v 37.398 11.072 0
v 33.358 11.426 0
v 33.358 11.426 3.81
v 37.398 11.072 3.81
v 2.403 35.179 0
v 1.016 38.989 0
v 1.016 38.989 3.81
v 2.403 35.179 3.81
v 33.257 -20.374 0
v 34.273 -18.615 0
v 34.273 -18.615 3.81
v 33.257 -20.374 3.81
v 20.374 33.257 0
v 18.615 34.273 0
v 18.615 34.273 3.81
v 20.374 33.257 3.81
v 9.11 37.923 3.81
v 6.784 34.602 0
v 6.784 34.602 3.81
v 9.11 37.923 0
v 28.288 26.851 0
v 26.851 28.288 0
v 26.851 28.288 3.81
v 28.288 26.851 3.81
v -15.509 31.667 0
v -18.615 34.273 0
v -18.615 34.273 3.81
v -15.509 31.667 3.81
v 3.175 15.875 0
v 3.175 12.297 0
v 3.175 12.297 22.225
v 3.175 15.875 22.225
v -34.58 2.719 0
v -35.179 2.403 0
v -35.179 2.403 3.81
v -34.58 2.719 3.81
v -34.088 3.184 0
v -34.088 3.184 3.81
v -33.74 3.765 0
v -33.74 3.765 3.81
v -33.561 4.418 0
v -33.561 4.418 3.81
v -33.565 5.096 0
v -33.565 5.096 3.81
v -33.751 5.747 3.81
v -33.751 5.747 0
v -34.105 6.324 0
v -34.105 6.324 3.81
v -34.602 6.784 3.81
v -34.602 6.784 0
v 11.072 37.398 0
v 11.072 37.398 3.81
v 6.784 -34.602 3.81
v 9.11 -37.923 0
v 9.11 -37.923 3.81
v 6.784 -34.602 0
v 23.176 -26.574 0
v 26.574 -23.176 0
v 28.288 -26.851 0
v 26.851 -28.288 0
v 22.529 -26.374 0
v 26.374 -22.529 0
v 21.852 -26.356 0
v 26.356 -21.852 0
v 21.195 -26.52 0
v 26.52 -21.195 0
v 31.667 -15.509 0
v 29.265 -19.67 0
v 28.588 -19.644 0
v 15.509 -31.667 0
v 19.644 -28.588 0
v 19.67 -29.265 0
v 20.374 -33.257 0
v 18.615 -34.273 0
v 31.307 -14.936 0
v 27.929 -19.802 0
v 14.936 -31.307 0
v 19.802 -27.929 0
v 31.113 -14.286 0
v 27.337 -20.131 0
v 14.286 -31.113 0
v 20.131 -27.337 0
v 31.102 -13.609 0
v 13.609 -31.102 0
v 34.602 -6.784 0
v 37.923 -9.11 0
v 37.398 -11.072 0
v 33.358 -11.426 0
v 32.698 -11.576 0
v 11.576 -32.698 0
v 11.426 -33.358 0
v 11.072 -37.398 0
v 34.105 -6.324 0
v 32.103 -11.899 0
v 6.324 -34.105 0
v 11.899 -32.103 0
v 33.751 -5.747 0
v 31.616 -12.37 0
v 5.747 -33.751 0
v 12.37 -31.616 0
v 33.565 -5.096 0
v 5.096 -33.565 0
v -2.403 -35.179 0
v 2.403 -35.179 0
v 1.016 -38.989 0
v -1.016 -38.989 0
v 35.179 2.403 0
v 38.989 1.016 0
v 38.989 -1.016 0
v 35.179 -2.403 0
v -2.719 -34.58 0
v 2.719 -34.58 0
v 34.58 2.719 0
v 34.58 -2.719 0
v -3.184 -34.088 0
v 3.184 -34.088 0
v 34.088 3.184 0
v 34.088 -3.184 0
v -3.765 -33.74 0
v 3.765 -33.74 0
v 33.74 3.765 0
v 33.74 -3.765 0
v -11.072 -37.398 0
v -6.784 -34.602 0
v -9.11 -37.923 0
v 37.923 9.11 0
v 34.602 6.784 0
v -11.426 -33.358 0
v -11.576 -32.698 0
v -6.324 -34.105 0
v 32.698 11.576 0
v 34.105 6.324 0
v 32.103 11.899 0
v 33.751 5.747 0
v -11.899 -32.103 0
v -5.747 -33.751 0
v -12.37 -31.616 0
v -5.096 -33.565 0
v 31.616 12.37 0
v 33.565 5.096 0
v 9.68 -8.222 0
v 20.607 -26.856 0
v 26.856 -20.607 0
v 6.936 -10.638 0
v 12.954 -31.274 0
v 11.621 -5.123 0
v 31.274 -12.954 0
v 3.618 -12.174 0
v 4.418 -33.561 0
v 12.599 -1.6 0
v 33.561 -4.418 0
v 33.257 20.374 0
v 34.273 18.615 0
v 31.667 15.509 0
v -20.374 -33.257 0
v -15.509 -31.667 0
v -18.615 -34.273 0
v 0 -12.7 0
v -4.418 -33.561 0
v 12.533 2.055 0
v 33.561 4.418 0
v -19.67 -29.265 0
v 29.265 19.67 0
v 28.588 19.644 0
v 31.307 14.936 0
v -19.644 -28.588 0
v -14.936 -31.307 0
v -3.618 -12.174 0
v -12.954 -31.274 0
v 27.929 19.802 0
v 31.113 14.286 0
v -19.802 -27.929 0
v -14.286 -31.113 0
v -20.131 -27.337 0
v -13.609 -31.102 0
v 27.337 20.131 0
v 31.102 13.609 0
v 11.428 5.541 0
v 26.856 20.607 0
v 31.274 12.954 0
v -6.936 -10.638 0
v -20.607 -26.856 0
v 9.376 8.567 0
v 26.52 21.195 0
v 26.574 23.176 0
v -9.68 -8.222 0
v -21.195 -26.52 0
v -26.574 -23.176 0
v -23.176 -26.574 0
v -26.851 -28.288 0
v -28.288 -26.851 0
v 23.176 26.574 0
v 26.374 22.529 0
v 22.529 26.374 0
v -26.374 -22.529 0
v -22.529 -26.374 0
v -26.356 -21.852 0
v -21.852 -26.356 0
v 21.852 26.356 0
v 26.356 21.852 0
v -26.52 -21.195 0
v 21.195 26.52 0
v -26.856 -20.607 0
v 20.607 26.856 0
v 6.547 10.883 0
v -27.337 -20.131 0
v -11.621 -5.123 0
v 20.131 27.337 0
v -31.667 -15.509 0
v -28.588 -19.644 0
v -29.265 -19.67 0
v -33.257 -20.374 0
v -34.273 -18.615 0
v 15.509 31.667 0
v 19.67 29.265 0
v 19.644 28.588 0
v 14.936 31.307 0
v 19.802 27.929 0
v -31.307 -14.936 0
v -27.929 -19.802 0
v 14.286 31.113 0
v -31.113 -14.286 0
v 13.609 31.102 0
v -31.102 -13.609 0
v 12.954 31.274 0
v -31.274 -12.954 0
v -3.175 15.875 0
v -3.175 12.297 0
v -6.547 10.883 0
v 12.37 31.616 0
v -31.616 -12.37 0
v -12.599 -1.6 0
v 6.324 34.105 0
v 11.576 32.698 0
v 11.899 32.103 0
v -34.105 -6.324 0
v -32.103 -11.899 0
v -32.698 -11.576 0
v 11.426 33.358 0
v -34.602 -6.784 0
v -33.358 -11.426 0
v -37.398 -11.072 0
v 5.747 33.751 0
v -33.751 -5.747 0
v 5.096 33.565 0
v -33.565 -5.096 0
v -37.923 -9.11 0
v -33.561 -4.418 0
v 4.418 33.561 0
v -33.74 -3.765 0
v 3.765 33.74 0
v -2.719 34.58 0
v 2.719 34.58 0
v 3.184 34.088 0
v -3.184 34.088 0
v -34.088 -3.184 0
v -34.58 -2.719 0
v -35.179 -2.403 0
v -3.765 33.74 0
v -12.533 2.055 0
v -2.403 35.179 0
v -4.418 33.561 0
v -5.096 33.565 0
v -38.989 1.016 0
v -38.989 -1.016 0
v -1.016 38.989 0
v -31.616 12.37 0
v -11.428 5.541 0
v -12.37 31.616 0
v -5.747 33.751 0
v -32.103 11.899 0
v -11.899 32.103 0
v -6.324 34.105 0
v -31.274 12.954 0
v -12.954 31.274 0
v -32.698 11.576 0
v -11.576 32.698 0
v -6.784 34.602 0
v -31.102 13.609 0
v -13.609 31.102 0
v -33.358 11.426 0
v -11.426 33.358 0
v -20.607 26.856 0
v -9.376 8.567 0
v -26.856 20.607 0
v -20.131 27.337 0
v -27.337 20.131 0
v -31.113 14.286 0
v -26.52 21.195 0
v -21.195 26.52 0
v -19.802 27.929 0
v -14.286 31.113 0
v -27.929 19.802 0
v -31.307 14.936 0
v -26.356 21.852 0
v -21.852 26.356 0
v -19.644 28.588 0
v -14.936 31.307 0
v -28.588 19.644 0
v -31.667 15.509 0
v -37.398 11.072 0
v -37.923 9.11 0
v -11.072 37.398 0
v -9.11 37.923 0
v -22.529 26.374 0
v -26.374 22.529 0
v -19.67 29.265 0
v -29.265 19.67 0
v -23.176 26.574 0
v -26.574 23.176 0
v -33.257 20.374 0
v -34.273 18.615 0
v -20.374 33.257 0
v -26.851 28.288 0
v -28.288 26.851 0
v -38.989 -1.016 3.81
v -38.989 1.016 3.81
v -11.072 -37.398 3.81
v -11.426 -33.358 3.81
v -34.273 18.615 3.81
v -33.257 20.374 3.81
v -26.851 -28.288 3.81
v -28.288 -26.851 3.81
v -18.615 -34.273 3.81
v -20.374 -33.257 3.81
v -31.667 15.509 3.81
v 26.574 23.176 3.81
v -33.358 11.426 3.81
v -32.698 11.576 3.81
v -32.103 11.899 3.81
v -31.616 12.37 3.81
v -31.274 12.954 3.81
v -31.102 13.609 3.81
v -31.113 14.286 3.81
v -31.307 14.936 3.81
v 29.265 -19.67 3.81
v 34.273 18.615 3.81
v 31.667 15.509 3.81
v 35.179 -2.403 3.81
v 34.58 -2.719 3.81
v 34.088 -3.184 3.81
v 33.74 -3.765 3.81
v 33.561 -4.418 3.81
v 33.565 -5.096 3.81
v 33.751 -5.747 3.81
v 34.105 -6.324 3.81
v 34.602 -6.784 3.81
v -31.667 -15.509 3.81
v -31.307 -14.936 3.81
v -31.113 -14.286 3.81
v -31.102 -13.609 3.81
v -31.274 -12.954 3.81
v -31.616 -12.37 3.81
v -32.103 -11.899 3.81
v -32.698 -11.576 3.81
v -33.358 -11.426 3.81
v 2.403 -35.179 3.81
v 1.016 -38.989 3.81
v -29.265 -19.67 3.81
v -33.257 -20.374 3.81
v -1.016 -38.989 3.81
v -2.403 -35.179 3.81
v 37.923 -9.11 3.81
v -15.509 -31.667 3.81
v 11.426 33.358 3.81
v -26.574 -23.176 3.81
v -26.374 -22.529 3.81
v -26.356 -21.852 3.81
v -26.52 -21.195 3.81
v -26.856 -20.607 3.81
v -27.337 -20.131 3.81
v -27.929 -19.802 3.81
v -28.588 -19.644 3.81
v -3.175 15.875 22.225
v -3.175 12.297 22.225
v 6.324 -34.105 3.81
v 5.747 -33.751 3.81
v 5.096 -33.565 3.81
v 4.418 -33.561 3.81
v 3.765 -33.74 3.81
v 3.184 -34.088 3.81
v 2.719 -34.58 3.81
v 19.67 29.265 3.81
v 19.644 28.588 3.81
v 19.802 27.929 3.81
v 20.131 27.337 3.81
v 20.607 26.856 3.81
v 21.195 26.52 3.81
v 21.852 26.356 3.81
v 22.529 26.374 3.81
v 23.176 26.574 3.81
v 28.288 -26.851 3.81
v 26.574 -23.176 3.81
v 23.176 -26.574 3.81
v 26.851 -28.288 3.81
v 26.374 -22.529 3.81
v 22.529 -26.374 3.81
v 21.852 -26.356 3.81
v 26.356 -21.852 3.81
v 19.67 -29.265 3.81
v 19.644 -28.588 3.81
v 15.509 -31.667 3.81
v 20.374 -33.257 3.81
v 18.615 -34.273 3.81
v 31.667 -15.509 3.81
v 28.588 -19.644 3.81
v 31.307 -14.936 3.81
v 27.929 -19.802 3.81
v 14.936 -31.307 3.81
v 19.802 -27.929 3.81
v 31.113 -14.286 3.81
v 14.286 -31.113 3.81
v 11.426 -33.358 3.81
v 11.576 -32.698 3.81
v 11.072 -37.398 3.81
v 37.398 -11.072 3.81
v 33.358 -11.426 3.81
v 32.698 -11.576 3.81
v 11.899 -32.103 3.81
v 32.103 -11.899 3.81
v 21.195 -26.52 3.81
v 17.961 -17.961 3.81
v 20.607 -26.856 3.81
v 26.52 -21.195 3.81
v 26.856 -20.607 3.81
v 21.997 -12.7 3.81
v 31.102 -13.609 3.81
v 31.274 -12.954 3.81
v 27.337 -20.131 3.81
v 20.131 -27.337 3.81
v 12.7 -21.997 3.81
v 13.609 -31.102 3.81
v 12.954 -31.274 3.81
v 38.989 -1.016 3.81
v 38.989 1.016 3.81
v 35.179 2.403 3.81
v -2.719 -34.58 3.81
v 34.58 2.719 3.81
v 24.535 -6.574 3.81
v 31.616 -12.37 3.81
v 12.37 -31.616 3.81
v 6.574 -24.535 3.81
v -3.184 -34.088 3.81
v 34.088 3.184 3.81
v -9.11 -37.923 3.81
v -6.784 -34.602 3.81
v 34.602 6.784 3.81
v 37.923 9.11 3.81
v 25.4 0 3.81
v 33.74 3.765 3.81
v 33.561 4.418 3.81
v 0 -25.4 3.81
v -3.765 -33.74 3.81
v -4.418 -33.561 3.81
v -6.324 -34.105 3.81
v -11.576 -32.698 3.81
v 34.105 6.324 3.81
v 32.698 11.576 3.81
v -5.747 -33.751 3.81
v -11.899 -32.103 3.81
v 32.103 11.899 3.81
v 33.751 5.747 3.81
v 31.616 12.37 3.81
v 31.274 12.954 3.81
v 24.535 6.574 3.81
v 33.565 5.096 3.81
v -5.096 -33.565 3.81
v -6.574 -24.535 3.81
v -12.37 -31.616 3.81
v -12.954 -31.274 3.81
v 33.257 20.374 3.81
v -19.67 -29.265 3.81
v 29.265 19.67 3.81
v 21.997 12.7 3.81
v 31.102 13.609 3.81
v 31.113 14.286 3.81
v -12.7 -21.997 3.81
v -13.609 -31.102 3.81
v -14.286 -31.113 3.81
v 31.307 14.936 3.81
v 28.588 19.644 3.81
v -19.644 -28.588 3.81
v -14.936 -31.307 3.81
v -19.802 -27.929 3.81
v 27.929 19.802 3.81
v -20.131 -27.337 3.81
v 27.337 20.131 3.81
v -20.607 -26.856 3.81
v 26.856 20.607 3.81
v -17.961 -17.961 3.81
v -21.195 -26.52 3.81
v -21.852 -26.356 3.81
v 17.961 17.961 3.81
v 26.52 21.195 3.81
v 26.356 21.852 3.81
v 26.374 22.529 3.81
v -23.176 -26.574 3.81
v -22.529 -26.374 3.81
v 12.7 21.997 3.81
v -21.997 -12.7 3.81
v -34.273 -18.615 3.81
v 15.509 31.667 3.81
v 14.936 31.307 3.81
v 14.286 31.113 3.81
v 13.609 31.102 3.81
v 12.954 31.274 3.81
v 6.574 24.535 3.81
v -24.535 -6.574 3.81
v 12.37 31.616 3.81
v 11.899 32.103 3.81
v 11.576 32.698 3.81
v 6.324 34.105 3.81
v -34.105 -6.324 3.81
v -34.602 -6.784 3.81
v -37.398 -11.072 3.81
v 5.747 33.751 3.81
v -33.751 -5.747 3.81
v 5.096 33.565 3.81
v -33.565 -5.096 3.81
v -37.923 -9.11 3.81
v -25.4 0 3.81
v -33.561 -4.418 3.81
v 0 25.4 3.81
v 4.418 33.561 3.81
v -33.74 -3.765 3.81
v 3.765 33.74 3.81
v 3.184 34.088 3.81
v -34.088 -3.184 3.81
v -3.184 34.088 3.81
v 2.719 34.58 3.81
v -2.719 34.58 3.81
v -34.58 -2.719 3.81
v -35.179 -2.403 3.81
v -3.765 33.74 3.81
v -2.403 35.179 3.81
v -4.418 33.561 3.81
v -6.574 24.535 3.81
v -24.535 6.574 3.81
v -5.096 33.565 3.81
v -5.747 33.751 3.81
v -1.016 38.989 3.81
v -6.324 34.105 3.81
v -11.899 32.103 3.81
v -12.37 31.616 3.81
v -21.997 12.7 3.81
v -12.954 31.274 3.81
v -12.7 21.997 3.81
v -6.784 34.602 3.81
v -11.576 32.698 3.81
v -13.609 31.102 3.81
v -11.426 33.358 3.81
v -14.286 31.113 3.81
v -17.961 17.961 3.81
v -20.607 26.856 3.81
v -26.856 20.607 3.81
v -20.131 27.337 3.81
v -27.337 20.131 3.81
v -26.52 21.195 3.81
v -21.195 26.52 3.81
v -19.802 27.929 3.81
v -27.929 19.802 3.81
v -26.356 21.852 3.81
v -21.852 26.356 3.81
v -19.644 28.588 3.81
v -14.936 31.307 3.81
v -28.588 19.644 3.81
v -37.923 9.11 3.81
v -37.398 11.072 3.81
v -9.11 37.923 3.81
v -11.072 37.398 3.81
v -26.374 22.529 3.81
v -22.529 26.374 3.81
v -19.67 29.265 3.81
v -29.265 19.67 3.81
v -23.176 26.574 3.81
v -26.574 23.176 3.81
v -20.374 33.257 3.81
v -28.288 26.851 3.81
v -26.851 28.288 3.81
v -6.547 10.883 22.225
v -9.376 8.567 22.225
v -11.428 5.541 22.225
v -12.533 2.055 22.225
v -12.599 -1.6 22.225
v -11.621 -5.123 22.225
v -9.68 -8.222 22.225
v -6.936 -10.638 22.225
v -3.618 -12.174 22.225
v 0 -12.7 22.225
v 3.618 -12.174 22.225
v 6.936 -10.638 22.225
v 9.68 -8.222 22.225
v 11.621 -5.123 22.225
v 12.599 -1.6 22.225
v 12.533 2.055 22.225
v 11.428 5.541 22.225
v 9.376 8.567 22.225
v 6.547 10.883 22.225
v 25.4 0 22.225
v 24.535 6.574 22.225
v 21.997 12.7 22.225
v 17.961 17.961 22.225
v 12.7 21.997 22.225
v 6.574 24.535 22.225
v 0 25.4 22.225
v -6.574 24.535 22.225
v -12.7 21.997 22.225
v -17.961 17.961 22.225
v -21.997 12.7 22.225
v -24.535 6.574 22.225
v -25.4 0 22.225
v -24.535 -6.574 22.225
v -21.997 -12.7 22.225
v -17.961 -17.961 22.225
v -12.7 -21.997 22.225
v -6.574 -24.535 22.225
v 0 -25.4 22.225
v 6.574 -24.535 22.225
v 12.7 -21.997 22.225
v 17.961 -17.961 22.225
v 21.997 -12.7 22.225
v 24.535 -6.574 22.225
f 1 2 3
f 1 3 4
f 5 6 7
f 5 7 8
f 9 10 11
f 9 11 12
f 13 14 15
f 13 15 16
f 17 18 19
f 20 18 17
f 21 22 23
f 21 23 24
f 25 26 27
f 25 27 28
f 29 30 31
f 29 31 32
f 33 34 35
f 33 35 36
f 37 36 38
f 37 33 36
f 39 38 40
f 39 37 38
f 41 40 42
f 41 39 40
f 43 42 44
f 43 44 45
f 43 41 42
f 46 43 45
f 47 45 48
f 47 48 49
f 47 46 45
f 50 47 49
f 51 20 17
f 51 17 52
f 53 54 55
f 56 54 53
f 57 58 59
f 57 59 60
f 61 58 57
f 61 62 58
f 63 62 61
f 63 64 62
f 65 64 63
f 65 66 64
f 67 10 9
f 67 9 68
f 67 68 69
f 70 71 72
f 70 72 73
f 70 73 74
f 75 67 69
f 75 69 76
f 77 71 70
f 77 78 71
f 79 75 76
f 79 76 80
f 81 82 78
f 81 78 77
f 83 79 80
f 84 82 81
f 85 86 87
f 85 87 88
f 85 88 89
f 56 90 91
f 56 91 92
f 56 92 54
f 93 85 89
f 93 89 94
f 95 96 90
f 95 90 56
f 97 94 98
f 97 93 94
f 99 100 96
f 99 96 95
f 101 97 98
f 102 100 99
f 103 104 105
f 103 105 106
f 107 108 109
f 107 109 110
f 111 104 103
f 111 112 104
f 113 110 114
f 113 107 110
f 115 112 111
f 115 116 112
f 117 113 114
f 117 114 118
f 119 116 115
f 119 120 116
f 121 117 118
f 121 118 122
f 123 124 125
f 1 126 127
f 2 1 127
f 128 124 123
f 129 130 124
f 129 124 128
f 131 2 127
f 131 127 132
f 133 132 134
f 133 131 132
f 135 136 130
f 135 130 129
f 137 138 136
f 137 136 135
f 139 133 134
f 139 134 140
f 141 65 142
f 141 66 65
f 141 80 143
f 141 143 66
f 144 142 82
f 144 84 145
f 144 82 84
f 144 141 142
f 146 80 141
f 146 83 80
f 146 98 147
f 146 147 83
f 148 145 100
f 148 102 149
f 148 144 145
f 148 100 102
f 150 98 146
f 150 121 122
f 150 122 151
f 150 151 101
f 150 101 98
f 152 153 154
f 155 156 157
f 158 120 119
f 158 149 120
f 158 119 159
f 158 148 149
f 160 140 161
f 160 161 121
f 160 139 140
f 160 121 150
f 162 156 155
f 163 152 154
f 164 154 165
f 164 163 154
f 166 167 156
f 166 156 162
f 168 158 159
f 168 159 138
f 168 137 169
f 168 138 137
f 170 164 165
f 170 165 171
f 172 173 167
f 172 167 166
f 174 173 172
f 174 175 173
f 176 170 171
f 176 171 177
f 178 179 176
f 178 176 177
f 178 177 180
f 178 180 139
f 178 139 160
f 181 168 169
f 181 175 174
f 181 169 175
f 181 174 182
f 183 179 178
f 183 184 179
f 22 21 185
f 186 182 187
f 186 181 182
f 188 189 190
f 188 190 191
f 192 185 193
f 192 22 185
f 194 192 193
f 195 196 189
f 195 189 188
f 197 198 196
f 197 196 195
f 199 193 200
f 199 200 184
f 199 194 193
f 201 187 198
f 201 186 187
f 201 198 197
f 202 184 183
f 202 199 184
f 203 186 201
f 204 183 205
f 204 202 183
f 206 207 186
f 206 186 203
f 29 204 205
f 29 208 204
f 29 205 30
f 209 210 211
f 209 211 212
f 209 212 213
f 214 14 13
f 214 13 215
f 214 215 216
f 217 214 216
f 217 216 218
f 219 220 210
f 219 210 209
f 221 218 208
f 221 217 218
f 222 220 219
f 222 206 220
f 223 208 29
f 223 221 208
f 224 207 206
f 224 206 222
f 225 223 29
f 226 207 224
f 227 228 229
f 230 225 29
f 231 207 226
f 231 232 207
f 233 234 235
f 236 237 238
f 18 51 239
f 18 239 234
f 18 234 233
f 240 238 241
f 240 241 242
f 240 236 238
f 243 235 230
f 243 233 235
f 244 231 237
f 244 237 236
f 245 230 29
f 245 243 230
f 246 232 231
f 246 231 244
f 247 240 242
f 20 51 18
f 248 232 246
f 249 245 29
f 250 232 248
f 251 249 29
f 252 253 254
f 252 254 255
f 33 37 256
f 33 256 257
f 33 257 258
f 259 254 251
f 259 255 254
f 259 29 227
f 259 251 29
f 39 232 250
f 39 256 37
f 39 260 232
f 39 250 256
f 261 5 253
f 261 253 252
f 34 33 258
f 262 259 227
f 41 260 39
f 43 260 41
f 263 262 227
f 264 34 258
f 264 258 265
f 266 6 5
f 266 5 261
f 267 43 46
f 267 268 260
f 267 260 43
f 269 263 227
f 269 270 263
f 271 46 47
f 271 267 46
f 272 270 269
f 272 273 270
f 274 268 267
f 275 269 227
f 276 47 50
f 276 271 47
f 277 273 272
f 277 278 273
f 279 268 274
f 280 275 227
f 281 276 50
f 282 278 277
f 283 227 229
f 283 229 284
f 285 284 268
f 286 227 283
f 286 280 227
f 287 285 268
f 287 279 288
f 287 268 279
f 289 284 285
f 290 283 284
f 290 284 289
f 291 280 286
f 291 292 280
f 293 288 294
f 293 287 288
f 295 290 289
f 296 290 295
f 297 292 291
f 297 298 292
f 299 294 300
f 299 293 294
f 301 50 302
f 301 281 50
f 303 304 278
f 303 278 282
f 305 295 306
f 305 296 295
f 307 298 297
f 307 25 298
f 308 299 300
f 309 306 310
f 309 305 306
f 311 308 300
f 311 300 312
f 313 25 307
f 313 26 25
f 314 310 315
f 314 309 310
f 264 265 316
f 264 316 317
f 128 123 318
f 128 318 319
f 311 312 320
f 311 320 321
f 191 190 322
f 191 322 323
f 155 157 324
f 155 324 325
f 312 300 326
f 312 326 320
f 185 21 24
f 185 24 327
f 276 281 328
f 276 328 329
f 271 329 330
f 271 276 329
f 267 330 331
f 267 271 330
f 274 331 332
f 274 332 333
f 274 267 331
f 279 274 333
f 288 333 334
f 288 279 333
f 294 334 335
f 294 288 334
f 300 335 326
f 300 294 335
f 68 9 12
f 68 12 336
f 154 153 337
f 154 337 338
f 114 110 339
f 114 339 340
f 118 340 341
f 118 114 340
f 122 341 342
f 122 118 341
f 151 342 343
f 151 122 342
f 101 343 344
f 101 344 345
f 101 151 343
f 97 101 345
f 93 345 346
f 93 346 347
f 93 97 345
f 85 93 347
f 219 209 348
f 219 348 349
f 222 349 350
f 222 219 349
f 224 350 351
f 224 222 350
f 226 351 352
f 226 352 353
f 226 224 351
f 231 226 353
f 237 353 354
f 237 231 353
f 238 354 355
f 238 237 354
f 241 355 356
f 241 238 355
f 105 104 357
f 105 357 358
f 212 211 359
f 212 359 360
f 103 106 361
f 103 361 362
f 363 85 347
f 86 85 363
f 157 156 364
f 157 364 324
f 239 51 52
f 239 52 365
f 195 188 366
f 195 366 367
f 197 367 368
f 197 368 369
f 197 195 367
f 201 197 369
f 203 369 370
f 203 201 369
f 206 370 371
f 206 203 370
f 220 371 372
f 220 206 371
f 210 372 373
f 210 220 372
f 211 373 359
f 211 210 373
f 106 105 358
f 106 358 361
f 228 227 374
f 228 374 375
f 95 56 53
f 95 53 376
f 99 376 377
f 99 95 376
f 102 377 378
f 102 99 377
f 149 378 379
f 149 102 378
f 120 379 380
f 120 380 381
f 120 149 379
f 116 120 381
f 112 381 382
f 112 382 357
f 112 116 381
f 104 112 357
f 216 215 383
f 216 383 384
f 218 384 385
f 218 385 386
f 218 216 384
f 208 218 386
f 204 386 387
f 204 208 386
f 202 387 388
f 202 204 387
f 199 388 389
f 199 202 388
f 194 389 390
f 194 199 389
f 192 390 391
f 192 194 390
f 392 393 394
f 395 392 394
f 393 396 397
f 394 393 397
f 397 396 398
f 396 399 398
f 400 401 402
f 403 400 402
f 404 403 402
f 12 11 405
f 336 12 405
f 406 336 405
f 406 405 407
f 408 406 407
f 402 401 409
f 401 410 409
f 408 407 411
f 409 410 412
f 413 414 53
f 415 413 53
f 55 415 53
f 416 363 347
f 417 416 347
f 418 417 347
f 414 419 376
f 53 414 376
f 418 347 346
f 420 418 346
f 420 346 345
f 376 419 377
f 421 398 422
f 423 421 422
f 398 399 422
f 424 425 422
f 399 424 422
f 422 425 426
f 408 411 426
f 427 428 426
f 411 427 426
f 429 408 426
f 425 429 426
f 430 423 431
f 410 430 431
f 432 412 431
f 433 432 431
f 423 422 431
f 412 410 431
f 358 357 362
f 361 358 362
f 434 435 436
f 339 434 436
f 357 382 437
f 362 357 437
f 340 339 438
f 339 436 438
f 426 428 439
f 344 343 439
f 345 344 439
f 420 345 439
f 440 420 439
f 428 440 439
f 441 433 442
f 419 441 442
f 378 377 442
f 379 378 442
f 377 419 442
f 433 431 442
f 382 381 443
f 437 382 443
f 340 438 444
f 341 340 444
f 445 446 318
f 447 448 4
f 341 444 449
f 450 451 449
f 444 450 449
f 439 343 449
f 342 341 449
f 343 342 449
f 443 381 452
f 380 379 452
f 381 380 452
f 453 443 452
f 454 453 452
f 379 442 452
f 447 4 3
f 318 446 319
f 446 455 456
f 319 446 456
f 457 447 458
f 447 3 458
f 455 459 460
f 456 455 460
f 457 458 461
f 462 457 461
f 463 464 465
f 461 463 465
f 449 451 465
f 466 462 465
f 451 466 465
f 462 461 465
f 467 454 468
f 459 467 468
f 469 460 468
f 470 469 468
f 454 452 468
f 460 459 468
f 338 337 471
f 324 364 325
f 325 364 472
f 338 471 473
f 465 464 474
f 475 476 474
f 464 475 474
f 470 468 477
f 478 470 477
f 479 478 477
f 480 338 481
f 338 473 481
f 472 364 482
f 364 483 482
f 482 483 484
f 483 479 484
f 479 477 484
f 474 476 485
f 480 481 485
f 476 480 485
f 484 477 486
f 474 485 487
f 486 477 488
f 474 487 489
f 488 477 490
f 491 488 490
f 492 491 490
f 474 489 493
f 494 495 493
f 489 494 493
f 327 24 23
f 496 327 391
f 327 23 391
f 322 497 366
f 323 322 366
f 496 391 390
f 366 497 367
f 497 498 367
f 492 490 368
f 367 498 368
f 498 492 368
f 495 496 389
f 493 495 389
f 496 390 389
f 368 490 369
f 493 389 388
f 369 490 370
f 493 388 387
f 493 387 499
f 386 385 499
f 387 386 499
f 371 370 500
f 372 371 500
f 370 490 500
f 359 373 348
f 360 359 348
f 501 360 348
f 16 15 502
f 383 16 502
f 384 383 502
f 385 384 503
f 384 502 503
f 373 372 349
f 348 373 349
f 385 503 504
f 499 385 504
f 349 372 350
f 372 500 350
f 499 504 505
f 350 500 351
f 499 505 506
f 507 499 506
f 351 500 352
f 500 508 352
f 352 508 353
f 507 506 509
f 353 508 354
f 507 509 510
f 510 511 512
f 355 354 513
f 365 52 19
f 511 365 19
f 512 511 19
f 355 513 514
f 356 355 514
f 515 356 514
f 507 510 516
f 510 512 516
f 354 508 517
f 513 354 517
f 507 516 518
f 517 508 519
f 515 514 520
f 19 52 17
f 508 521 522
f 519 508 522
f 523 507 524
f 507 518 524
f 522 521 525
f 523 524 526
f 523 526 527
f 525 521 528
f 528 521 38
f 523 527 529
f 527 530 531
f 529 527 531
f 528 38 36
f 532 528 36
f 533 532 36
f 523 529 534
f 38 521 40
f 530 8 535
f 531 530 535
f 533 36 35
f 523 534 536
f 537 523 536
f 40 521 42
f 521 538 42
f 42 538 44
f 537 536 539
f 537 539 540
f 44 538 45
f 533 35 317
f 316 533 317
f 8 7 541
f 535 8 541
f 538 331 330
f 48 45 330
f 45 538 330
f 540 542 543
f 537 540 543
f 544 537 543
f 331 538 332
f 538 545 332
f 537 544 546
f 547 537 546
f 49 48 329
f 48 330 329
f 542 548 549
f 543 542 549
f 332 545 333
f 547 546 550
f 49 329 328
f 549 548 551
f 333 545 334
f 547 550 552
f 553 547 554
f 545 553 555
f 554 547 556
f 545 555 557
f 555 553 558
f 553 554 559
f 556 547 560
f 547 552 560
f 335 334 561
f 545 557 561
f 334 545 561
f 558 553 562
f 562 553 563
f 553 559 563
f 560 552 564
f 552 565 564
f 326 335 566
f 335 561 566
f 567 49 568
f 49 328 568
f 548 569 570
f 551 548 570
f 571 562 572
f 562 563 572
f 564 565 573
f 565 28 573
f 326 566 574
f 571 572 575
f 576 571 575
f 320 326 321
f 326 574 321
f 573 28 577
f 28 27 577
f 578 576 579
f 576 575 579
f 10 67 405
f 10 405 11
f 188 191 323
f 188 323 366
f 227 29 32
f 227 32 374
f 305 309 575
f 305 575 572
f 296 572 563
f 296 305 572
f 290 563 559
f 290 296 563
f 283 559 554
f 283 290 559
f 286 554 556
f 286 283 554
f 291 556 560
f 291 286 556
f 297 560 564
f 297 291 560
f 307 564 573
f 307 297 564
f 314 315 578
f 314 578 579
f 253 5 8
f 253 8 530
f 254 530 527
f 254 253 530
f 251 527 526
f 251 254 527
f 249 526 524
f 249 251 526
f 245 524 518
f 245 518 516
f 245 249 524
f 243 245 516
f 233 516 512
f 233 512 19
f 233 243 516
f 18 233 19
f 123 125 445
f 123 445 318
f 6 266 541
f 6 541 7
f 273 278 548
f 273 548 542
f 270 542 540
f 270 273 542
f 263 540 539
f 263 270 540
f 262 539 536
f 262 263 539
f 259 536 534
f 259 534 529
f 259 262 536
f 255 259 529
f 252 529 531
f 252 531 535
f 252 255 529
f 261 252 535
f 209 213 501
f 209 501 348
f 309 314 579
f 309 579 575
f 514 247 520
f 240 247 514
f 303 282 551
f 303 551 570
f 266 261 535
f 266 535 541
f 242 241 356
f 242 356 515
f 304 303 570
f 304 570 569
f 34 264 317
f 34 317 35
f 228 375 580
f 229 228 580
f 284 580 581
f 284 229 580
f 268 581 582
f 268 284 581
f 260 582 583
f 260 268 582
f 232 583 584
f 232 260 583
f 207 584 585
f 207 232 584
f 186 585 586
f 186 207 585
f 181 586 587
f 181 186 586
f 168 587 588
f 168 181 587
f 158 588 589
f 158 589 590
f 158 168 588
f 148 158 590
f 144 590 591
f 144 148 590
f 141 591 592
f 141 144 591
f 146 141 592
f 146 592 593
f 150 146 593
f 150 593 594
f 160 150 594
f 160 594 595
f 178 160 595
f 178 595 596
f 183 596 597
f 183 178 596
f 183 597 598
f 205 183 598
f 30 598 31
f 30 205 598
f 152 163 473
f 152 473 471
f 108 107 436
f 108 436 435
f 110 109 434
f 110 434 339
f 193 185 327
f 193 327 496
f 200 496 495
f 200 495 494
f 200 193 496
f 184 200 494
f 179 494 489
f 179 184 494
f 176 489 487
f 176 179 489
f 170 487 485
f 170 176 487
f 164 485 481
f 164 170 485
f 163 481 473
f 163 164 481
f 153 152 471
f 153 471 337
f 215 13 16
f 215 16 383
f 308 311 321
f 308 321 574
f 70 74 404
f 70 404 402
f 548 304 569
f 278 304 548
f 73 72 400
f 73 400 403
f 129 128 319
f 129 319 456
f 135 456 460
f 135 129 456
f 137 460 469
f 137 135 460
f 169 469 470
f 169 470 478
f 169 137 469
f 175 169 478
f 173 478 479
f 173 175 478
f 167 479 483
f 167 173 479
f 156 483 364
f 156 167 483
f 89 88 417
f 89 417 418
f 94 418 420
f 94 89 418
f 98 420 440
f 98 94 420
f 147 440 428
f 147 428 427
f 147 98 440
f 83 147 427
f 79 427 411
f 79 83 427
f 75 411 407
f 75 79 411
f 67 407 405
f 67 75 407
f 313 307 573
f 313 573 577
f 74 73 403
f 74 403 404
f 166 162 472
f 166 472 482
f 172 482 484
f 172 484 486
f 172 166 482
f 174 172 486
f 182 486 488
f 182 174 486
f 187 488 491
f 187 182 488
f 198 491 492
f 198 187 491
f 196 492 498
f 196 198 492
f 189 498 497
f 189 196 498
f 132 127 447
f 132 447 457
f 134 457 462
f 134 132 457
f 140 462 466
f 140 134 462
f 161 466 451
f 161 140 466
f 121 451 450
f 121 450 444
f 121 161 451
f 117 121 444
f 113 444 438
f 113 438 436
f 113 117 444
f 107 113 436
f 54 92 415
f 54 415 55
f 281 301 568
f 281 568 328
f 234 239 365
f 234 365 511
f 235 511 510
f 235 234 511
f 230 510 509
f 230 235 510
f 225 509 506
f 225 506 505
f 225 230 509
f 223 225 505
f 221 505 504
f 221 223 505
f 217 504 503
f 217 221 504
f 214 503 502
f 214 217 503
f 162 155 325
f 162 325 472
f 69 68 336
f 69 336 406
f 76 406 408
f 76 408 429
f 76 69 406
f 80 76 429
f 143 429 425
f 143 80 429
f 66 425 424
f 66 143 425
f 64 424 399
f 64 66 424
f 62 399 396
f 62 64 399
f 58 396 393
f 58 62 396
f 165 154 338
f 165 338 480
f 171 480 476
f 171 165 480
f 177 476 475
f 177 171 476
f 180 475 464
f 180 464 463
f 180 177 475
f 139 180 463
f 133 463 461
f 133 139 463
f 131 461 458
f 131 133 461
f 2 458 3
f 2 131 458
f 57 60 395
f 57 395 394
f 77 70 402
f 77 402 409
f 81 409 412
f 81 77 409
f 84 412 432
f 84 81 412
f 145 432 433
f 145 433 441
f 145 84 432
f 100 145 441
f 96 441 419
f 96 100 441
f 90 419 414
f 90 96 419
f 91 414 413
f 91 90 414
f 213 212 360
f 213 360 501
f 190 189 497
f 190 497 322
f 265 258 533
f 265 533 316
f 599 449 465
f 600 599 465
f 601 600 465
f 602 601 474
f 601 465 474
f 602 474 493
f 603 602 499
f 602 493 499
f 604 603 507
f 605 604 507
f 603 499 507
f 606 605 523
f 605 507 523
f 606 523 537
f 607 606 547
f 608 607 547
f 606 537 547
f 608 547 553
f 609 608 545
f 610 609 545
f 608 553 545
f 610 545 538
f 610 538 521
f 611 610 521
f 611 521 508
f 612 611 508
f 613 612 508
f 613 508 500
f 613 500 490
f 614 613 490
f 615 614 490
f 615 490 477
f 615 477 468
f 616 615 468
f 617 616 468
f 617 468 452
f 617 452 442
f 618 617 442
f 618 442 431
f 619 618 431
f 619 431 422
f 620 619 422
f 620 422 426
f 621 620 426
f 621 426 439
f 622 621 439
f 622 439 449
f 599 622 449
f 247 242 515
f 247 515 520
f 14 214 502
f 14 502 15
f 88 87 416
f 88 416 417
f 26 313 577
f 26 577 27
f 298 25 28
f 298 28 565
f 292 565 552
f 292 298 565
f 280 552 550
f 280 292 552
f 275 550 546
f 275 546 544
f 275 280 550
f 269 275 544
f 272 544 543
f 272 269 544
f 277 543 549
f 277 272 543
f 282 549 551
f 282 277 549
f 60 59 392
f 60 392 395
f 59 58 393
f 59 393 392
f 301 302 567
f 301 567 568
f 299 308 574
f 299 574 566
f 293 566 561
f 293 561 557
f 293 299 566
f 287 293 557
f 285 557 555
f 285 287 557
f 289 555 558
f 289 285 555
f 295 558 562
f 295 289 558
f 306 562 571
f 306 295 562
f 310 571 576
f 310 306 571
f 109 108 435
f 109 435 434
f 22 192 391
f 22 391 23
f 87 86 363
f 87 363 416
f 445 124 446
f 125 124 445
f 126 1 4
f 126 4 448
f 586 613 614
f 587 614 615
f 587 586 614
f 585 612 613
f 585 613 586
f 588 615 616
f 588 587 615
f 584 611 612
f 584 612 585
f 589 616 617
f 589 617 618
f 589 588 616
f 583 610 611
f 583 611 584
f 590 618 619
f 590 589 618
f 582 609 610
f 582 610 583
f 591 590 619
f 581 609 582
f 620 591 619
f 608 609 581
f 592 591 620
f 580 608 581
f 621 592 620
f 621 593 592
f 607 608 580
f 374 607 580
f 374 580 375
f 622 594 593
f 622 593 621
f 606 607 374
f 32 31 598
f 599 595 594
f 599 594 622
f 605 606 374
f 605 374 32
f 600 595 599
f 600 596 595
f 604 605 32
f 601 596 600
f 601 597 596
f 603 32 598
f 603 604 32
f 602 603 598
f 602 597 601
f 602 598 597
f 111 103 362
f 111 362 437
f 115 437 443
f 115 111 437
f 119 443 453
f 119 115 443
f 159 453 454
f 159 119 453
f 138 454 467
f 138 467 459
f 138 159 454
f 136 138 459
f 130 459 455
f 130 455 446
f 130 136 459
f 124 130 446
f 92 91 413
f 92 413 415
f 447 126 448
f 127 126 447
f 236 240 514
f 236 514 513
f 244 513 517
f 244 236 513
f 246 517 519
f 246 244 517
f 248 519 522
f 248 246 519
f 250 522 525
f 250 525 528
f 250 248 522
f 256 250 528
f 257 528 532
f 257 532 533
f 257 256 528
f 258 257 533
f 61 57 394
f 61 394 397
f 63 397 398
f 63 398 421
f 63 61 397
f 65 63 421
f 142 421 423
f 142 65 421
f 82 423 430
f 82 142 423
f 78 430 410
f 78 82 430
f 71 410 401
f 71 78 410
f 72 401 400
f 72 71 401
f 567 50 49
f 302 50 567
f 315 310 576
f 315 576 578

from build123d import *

# Parameters (mm, degrees)
SKETCH1_R           = 25.4
BOSS_EXTRUDE1_DEPTH = 3.81
SKETCH1_3_R         = 25.4
BOSS_EXTRUDE2_DEPTH = 22.225


with BuildPart() as part:
    # Sketch1 → Boss-Extrude1 (new body)
    with BuildSketch(Plane.XY):
        with BuildLine():
            Line((1.016, 38.989), (-1.016, 38.989))
            Line((-1.016, 38.989), (-2.402726593, 35.179))
            ThreePointArc((-2.402726593, 35.179), (-4.418420371, 33.561234708), (-6.784139518, 34.602176045))
            Line((-6.784139518, 34.602176045), (-9.10971511, 37.923442191))
            Line((-9.10971511, 37.923442191), (-11.072476389, 37.397521891))
            Line((-11.072476389, 37.397521891), (-11.425850857, 33.358433241))
            ThreePointArc((-11.425850857, 33.358433241), (-12.954153068, 31.274092025), (-15.508677732, 31.667270976))
            Line((-15.508677732, 31.667270976), (-18.61461819, 34.273464468))
            Line((-18.61461819, 34.273464468), (-20.37438181, 33.257464468))
            Line((-20.37438181, 33.257464468), (-19.670322267, 29.264544383))
            ThreePointArc((-19.670322268, 29.264544383), (-20.60708164, 26.855671653), (-23.176325188, 26.574293722))
            Line((-23.176325188, 26.574293722), (-26.850965802, 28.287806781))
            Line((-26.850965802, 28.287806781), (-28.287806781, 26.850965802))
            Line((-28.287806781, 26.850965802), (-26.574293722, 23.176325188))
            ThreePointArc((-26.574293722, 23.176325188), (-26.855671653, 20.60708164), (-29.264544383, 19.670322268))
            Line((-29.264544383, 19.670322268), (-33.257464468, 20.37438181))
            Line((-33.257464468, 20.37438181), (-34.273464468, 18.61461819))
            Line((-34.273464468, 18.61461819), (-31.667270976, 15.508677732))
            ThreePointArc((-31.667270976, 15.508677732), (-31.274092025, 12.954153068), (-33.358433241, 11.425850857))
            Line((-33.358433241, 11.425850857), (-37.397521891, 11.072476389))
            Line((-37.397521891, 11.072476389), (-37.923442191, 9.10971511))
            Line((-37.923442191, 9.10971511), (-34.602176045, 6.784139518))
            ThreePointArc((-34.602176045, 6.784139518), (-33.561234708, 4.418420371), (-35.179, 2.402726593))
            Line((-35.179, 2.402726593), (-38.989, 1.016))
            Line((-38.989, 1.016), (-38.989, -1.016))
            Line((-38.989, -1.016), (-35.179, -2.402726593))
            ThreePointArc((-35.179, -2.402726593), (-33.561234708, -4.418420371), (-34.602176045, -6.784139518))
            Line((-34.602176045, -6.784139518), (-37.923442191, -9.10971511))
            Line((-37.923442191, -9.10971511), (-37.397521891, -11.072476389))
            Line((-37.397521891, -11.072476389), (-33.358433241, -11.425850857))
            ThreePointArc((-33.358433241, -11.425850857), (-31.274092025, -12.954153068), (-31.667270976, -15.508677732))
            Line((-31.667270976, -15.508677732), (-34.273464468, -18.61461819))
            Line((-34.273464468, -18.61461819), (-33.257464468, -20.37438181))
            Line((-33.257464468, -20.37438181), (-29.264544383, -19.670322268))
            ThreePointArc((-29.264544383, -19.670322268), (-26.855671653, -20.60708164), (-26.574293722, -23.176325188))
            Line((-26.574293722, -23.176325188), (-28.287806781, -26.850965802))
            Line((-28.287806781, -26.850965802), (-26.850965802, -28.287806781))
            Line((-26.850965802, -28.287806781), (-23.176325188, -26.574293722))
            ThreePointArc((-23.176325188, -26.574293722), (-20.60708164, -26.855671653), (-19.670322268, -29.264544383))
            Line((-19.670322268, -29.264544383), (-20.37438181, -33.257464468))
            Line((-20.37438181, -33.257464468), (-18.61461819, -34.273464468))
            Line((-18.61461819, -34.273464468), (-15.508677732, -31.667270976))
            ThreePointArc((-15.508677732, -31.667270976), (-12.954153068, -31.274092025), (-11.425850857, -33.358433241))
            Line((-11.425850857, -33.358433241), (-11.072476389, -37.397521891))
            Line((-11.072476389, -37.397521891), (-9.10971511, -37.923442191))
            Line((-9.10971511, -37.923442191), (-6.784139518, -34.602176045))
            ThreePointArc((-6.784139518, -34.602176045), (-4.418420371, -33.561234708), (-2.402726593, -35.179))
            Line((-2.402726593, -35.179), (-1.016, -38.989))
            Line((-1.016, -38.989), (1.016, -38.989))
            Line((1.016, -38.989), (2.402726593, -35.179))
            ThreePointArc((2.402726593, -35.179), (4.418420371, -33.561234708), (6.784139518, -34.602176045))
            Line((6.784139518, -34.602176045), (9.10971511, -37.923442191))
            Line((9.10971511, -37.923442191), (11.072476389, -37.397521891))
            Line((11.072476389, -37.397521891), (11.425850857, -33.358433241))
            ThreePointArc((11.425850857, -33.358433241), (12.954153068, -31.274092025), (15.508677732, -31.667270976))
            Line((15.508677732, -31.667270976), (18.61461819, -34.273464468))
            Line((18.61461819, -34.273464468), (20.37438181, -33.257464468))
            Line((20.37438181, -33.257464468), (19.670322268, -29.264544383))
            ThreePointArc((19.670322268, -29.264544383), (20.60708164, -26.855671653), (23.176325188, -26.574293722))
            Line((23.176325188, -26.574293722), (26.850965802, -28.287806781))
            Line((26.850965802, -28.287806781), (28.287806781, -26.850965802))
            Line((28.287806781, -26.850965802), (26.574293722, -23.176325188))
            ThreePointArc((26.574293722, -23.176325188), (26.855671653, -20.60708164), (29.264544383, -19.670322268))
            Line((29.264544383, -19.670322268), (33.257464468, -20.37438181))
            Line((33.257464468, -20.37438181), (34.273464468, -18.61461819))
            Line((34.273464468, -18.61461819), (31.667270976, -15.508677732))
            ThreePointArc((31.667270976, -15.508677732), (31.274092025, -12.954153068), (33.358433241, -11.425850857))
            Line((33.358433241, -11.425850857), (37.397521891, -11.072476389))
            Line((37.397521891, -11.072476389), (37.923442191, -9.10971511))
            Line((37.923442191, -9.10971511), (34.602176045, -6.784139518))
            ThreePointArc((34.602176045, -6.784139518), (33.561234708, -4.418420371), (35.179, -2.402726593))
            Line((35.179, -2.402726593), (38.989, -1.016))
            Line((38.989, -1.016), (38.989, 1.016))
            Line((38.989, 1.016), (35.179, 2.402726593))
            ThreePointArc((35.179, 2.402726593), (33.561234708, 4.418420371), (34.602176045, 6.784139518))
            Line((34.602176045, 6.784139518), (37.923442191, 9.10971511))
            Line((37.923442191, 9.10971511), (37.397521891, 11.072476389))
            Line((37.397521891, 11.072476389), (33.358433241, 11.425850857))
            ThreePointArc((33.358433241, 11.425850857), (31.274092025, 12.954153068), (31.667270976, 15.508677732))
            Line((31.667270976, 15.508677732), (34.273464468, 18.61461819))
            Line((34.273464468, 18.61461819), (33.257464468, 20.37438181))
            Line((33.257464468, 20.37438181), (29.264544383, 19.670322268))
            ThreePointArc((29.264544383, 19.670322268), (26.855671653, 20.60708164), (26.574293722, 23.176325188))
            Line((26.574293722, 23.176325188), (28.287806781, 26.850965802))
            Line((28.287806781, 26.850965802), (26.850965802, 28.287806781))
            Line((26.850965802, 28.287806781), (23.176325188, 26.574293722))
            ThreePointArc((23.176325188, 26.574293722), (20.60708164, 26.855671653), (19.670322268, 29.264544383))
            Line((19.670322268, 29.264544383), (20.37438181, 33.257464468))
            Line((20.37438181, 33.257464468), (18.61461819, 34.273464468))
            Line((18.61461819, 34.273464468), (15.508677732, 31.667270976))
            ThreePointArc((15.508677732, 31.667270976), (12.954153068, 31.274092025), (11.425850857, 33.358433241))
            Line((11.425850857, 33.358433241), (11.072476389, 37.397521891))
            Line((11.072476389, 37.397521891), (9.10971511, 37.923442191))
            Line((9.10971511, 37.923442191), (6.784139518, 34.602176045))
            ThreePointArc((6.784139518, 34.602176045), (4.418420371, 33.561234708), (2.402726593, 35.179))
            Line((2.402726593, 35.179), (1.016, 38.989))
        make_face()
        Circle(SKETCH1_R, mode=Mode.SUBTRACT)
    extrude(amount=BOSS_EXTRUDE1_DEPTH)

    # Sketch1<3> → Boss-Extrude2 (add)
    with BuildSketch(Plane.XY):
        Circle(SKETCH1_3_R)
        with BuildLine():
            ThreePointArc((3.175, 12.296722124), (0, -12.7), (-3.175, 12.296722124))
            Line((-3.175, 12.296722124), (-3.175, 15.875))
            Line((-3.175, 15.875), (3.175, 15.875))
            Line((3.175, 15.875), (3.175, 12.296722124))
        make_face(mode=Mode.SUBTRACT)
    extrude(amount=BOSS_EXTRUDE2_DEPTH)


solid = part.part
